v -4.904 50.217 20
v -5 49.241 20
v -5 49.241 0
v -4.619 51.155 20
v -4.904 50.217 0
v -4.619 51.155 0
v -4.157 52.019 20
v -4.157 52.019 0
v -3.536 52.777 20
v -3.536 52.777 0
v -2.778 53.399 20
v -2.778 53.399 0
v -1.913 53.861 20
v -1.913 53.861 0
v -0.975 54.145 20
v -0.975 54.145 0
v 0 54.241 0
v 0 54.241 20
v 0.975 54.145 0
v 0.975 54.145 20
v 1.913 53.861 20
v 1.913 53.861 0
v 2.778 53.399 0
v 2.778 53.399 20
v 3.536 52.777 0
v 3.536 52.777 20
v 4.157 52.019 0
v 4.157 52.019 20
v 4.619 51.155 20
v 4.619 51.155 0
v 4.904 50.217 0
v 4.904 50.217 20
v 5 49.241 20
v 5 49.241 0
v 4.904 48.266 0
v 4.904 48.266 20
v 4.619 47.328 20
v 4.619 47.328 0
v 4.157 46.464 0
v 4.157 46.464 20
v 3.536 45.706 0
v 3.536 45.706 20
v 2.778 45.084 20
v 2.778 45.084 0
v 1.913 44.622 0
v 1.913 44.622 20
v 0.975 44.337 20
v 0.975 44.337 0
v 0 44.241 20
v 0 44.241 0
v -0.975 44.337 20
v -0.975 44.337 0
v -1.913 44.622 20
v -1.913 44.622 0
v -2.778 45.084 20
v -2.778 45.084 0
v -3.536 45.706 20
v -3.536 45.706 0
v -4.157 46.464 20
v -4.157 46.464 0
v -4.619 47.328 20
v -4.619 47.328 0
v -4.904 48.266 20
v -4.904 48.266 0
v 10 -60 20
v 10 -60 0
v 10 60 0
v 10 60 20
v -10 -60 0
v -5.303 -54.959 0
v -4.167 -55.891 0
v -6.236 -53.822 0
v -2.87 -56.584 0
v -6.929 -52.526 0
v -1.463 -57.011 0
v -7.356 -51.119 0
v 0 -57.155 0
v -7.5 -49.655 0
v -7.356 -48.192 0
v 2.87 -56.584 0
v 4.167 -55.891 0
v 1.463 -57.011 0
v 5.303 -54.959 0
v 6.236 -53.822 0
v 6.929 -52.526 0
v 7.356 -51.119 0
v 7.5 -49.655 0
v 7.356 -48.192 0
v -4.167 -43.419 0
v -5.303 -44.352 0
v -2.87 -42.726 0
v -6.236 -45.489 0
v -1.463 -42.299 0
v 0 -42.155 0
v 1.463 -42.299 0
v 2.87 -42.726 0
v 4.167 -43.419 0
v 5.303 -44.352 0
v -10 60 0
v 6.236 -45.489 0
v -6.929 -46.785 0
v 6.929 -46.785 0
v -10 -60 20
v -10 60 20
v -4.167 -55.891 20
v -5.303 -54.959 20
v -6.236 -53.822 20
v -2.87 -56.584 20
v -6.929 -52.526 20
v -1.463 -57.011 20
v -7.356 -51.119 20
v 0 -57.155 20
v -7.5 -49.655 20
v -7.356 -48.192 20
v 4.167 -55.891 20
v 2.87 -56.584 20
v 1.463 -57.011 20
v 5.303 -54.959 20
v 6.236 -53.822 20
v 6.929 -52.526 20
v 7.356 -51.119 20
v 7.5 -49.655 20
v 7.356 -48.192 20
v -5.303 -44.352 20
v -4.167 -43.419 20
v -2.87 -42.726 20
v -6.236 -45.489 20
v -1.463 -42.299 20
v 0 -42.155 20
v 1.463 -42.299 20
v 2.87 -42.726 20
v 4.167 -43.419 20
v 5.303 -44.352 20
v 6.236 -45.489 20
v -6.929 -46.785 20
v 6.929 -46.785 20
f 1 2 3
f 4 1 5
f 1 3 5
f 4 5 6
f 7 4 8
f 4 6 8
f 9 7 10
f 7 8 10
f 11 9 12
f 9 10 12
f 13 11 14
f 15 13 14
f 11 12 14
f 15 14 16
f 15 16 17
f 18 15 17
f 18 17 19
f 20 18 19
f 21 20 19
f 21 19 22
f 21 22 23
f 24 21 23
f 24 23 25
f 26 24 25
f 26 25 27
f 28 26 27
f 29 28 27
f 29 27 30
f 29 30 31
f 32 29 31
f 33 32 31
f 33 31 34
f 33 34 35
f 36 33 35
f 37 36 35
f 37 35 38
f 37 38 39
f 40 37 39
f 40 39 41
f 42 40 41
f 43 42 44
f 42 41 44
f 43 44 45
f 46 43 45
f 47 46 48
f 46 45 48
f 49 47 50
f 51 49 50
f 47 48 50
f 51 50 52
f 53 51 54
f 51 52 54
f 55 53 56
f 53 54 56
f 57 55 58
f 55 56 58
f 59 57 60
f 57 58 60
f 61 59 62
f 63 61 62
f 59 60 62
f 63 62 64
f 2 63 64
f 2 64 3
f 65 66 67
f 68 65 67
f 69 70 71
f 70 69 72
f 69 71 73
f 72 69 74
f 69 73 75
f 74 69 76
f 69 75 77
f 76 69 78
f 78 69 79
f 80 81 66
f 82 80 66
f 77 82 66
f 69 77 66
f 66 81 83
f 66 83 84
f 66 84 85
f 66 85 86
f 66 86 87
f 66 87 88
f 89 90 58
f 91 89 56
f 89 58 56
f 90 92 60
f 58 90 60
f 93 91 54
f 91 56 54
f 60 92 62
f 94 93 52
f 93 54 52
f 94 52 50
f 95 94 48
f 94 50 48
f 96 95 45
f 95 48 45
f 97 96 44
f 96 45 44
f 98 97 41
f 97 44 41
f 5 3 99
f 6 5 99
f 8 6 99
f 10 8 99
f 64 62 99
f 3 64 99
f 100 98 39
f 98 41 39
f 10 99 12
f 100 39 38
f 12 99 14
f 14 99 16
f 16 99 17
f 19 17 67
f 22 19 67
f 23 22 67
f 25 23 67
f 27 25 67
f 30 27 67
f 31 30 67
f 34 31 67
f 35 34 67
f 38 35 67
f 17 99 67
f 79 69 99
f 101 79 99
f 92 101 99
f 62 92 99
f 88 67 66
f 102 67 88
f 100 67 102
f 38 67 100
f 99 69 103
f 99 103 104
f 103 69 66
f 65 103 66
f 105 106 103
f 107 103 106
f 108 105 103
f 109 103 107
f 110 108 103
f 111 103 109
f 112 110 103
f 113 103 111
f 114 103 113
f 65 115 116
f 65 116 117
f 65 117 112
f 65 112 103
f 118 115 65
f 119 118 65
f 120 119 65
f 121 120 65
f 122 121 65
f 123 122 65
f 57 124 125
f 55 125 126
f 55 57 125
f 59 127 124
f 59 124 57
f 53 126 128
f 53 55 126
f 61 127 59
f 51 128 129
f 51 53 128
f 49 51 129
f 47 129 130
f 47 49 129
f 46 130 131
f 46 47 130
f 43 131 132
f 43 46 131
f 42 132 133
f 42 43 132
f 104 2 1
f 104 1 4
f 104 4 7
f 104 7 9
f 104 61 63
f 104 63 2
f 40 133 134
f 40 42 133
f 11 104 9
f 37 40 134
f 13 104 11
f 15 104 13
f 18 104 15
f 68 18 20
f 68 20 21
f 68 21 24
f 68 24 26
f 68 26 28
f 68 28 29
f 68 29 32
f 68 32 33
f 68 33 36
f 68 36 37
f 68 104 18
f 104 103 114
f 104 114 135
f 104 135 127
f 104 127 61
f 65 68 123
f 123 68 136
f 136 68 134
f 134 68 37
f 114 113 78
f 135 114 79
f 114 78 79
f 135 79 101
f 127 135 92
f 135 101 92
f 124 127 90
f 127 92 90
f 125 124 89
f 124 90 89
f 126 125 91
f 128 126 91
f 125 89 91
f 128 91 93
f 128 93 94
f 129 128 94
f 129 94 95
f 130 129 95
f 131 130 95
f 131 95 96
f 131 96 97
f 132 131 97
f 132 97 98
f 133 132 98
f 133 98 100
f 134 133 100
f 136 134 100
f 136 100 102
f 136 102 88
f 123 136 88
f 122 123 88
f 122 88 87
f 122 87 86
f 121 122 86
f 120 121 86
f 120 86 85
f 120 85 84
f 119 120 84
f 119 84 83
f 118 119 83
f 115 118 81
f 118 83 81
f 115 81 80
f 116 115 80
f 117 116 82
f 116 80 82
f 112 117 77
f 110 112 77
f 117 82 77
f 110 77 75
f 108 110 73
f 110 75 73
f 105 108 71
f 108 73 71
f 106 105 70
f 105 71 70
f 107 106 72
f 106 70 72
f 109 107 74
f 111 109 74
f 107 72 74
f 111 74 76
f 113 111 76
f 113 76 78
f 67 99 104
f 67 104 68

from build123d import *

# Parameters (mm, degrees)
F0_W     = 20
F0_H     = 120
F1_DEPTH = 20
F4_D     = 15
F6_D     = 10


with BuildPart() as f1:
    # F0 (on Top) → F1 (new body)
    with BuildSketch(Plane.XY):
        Rectangle(F0_W, F0_H)
    extrude(amount=F1_DEPTH)

    # F4 (through all)
    with Locations(Plane.XY.offset(20)):
        with Locations((0, -49.655378)):
            Hole(F4_D / 2)

    # F6 (through all)
    with Locations(Plane.XY.offset(20)):
        with Locations((0, 49.241364)):
            Hole(F6_D / 2)


solid = f1.part
